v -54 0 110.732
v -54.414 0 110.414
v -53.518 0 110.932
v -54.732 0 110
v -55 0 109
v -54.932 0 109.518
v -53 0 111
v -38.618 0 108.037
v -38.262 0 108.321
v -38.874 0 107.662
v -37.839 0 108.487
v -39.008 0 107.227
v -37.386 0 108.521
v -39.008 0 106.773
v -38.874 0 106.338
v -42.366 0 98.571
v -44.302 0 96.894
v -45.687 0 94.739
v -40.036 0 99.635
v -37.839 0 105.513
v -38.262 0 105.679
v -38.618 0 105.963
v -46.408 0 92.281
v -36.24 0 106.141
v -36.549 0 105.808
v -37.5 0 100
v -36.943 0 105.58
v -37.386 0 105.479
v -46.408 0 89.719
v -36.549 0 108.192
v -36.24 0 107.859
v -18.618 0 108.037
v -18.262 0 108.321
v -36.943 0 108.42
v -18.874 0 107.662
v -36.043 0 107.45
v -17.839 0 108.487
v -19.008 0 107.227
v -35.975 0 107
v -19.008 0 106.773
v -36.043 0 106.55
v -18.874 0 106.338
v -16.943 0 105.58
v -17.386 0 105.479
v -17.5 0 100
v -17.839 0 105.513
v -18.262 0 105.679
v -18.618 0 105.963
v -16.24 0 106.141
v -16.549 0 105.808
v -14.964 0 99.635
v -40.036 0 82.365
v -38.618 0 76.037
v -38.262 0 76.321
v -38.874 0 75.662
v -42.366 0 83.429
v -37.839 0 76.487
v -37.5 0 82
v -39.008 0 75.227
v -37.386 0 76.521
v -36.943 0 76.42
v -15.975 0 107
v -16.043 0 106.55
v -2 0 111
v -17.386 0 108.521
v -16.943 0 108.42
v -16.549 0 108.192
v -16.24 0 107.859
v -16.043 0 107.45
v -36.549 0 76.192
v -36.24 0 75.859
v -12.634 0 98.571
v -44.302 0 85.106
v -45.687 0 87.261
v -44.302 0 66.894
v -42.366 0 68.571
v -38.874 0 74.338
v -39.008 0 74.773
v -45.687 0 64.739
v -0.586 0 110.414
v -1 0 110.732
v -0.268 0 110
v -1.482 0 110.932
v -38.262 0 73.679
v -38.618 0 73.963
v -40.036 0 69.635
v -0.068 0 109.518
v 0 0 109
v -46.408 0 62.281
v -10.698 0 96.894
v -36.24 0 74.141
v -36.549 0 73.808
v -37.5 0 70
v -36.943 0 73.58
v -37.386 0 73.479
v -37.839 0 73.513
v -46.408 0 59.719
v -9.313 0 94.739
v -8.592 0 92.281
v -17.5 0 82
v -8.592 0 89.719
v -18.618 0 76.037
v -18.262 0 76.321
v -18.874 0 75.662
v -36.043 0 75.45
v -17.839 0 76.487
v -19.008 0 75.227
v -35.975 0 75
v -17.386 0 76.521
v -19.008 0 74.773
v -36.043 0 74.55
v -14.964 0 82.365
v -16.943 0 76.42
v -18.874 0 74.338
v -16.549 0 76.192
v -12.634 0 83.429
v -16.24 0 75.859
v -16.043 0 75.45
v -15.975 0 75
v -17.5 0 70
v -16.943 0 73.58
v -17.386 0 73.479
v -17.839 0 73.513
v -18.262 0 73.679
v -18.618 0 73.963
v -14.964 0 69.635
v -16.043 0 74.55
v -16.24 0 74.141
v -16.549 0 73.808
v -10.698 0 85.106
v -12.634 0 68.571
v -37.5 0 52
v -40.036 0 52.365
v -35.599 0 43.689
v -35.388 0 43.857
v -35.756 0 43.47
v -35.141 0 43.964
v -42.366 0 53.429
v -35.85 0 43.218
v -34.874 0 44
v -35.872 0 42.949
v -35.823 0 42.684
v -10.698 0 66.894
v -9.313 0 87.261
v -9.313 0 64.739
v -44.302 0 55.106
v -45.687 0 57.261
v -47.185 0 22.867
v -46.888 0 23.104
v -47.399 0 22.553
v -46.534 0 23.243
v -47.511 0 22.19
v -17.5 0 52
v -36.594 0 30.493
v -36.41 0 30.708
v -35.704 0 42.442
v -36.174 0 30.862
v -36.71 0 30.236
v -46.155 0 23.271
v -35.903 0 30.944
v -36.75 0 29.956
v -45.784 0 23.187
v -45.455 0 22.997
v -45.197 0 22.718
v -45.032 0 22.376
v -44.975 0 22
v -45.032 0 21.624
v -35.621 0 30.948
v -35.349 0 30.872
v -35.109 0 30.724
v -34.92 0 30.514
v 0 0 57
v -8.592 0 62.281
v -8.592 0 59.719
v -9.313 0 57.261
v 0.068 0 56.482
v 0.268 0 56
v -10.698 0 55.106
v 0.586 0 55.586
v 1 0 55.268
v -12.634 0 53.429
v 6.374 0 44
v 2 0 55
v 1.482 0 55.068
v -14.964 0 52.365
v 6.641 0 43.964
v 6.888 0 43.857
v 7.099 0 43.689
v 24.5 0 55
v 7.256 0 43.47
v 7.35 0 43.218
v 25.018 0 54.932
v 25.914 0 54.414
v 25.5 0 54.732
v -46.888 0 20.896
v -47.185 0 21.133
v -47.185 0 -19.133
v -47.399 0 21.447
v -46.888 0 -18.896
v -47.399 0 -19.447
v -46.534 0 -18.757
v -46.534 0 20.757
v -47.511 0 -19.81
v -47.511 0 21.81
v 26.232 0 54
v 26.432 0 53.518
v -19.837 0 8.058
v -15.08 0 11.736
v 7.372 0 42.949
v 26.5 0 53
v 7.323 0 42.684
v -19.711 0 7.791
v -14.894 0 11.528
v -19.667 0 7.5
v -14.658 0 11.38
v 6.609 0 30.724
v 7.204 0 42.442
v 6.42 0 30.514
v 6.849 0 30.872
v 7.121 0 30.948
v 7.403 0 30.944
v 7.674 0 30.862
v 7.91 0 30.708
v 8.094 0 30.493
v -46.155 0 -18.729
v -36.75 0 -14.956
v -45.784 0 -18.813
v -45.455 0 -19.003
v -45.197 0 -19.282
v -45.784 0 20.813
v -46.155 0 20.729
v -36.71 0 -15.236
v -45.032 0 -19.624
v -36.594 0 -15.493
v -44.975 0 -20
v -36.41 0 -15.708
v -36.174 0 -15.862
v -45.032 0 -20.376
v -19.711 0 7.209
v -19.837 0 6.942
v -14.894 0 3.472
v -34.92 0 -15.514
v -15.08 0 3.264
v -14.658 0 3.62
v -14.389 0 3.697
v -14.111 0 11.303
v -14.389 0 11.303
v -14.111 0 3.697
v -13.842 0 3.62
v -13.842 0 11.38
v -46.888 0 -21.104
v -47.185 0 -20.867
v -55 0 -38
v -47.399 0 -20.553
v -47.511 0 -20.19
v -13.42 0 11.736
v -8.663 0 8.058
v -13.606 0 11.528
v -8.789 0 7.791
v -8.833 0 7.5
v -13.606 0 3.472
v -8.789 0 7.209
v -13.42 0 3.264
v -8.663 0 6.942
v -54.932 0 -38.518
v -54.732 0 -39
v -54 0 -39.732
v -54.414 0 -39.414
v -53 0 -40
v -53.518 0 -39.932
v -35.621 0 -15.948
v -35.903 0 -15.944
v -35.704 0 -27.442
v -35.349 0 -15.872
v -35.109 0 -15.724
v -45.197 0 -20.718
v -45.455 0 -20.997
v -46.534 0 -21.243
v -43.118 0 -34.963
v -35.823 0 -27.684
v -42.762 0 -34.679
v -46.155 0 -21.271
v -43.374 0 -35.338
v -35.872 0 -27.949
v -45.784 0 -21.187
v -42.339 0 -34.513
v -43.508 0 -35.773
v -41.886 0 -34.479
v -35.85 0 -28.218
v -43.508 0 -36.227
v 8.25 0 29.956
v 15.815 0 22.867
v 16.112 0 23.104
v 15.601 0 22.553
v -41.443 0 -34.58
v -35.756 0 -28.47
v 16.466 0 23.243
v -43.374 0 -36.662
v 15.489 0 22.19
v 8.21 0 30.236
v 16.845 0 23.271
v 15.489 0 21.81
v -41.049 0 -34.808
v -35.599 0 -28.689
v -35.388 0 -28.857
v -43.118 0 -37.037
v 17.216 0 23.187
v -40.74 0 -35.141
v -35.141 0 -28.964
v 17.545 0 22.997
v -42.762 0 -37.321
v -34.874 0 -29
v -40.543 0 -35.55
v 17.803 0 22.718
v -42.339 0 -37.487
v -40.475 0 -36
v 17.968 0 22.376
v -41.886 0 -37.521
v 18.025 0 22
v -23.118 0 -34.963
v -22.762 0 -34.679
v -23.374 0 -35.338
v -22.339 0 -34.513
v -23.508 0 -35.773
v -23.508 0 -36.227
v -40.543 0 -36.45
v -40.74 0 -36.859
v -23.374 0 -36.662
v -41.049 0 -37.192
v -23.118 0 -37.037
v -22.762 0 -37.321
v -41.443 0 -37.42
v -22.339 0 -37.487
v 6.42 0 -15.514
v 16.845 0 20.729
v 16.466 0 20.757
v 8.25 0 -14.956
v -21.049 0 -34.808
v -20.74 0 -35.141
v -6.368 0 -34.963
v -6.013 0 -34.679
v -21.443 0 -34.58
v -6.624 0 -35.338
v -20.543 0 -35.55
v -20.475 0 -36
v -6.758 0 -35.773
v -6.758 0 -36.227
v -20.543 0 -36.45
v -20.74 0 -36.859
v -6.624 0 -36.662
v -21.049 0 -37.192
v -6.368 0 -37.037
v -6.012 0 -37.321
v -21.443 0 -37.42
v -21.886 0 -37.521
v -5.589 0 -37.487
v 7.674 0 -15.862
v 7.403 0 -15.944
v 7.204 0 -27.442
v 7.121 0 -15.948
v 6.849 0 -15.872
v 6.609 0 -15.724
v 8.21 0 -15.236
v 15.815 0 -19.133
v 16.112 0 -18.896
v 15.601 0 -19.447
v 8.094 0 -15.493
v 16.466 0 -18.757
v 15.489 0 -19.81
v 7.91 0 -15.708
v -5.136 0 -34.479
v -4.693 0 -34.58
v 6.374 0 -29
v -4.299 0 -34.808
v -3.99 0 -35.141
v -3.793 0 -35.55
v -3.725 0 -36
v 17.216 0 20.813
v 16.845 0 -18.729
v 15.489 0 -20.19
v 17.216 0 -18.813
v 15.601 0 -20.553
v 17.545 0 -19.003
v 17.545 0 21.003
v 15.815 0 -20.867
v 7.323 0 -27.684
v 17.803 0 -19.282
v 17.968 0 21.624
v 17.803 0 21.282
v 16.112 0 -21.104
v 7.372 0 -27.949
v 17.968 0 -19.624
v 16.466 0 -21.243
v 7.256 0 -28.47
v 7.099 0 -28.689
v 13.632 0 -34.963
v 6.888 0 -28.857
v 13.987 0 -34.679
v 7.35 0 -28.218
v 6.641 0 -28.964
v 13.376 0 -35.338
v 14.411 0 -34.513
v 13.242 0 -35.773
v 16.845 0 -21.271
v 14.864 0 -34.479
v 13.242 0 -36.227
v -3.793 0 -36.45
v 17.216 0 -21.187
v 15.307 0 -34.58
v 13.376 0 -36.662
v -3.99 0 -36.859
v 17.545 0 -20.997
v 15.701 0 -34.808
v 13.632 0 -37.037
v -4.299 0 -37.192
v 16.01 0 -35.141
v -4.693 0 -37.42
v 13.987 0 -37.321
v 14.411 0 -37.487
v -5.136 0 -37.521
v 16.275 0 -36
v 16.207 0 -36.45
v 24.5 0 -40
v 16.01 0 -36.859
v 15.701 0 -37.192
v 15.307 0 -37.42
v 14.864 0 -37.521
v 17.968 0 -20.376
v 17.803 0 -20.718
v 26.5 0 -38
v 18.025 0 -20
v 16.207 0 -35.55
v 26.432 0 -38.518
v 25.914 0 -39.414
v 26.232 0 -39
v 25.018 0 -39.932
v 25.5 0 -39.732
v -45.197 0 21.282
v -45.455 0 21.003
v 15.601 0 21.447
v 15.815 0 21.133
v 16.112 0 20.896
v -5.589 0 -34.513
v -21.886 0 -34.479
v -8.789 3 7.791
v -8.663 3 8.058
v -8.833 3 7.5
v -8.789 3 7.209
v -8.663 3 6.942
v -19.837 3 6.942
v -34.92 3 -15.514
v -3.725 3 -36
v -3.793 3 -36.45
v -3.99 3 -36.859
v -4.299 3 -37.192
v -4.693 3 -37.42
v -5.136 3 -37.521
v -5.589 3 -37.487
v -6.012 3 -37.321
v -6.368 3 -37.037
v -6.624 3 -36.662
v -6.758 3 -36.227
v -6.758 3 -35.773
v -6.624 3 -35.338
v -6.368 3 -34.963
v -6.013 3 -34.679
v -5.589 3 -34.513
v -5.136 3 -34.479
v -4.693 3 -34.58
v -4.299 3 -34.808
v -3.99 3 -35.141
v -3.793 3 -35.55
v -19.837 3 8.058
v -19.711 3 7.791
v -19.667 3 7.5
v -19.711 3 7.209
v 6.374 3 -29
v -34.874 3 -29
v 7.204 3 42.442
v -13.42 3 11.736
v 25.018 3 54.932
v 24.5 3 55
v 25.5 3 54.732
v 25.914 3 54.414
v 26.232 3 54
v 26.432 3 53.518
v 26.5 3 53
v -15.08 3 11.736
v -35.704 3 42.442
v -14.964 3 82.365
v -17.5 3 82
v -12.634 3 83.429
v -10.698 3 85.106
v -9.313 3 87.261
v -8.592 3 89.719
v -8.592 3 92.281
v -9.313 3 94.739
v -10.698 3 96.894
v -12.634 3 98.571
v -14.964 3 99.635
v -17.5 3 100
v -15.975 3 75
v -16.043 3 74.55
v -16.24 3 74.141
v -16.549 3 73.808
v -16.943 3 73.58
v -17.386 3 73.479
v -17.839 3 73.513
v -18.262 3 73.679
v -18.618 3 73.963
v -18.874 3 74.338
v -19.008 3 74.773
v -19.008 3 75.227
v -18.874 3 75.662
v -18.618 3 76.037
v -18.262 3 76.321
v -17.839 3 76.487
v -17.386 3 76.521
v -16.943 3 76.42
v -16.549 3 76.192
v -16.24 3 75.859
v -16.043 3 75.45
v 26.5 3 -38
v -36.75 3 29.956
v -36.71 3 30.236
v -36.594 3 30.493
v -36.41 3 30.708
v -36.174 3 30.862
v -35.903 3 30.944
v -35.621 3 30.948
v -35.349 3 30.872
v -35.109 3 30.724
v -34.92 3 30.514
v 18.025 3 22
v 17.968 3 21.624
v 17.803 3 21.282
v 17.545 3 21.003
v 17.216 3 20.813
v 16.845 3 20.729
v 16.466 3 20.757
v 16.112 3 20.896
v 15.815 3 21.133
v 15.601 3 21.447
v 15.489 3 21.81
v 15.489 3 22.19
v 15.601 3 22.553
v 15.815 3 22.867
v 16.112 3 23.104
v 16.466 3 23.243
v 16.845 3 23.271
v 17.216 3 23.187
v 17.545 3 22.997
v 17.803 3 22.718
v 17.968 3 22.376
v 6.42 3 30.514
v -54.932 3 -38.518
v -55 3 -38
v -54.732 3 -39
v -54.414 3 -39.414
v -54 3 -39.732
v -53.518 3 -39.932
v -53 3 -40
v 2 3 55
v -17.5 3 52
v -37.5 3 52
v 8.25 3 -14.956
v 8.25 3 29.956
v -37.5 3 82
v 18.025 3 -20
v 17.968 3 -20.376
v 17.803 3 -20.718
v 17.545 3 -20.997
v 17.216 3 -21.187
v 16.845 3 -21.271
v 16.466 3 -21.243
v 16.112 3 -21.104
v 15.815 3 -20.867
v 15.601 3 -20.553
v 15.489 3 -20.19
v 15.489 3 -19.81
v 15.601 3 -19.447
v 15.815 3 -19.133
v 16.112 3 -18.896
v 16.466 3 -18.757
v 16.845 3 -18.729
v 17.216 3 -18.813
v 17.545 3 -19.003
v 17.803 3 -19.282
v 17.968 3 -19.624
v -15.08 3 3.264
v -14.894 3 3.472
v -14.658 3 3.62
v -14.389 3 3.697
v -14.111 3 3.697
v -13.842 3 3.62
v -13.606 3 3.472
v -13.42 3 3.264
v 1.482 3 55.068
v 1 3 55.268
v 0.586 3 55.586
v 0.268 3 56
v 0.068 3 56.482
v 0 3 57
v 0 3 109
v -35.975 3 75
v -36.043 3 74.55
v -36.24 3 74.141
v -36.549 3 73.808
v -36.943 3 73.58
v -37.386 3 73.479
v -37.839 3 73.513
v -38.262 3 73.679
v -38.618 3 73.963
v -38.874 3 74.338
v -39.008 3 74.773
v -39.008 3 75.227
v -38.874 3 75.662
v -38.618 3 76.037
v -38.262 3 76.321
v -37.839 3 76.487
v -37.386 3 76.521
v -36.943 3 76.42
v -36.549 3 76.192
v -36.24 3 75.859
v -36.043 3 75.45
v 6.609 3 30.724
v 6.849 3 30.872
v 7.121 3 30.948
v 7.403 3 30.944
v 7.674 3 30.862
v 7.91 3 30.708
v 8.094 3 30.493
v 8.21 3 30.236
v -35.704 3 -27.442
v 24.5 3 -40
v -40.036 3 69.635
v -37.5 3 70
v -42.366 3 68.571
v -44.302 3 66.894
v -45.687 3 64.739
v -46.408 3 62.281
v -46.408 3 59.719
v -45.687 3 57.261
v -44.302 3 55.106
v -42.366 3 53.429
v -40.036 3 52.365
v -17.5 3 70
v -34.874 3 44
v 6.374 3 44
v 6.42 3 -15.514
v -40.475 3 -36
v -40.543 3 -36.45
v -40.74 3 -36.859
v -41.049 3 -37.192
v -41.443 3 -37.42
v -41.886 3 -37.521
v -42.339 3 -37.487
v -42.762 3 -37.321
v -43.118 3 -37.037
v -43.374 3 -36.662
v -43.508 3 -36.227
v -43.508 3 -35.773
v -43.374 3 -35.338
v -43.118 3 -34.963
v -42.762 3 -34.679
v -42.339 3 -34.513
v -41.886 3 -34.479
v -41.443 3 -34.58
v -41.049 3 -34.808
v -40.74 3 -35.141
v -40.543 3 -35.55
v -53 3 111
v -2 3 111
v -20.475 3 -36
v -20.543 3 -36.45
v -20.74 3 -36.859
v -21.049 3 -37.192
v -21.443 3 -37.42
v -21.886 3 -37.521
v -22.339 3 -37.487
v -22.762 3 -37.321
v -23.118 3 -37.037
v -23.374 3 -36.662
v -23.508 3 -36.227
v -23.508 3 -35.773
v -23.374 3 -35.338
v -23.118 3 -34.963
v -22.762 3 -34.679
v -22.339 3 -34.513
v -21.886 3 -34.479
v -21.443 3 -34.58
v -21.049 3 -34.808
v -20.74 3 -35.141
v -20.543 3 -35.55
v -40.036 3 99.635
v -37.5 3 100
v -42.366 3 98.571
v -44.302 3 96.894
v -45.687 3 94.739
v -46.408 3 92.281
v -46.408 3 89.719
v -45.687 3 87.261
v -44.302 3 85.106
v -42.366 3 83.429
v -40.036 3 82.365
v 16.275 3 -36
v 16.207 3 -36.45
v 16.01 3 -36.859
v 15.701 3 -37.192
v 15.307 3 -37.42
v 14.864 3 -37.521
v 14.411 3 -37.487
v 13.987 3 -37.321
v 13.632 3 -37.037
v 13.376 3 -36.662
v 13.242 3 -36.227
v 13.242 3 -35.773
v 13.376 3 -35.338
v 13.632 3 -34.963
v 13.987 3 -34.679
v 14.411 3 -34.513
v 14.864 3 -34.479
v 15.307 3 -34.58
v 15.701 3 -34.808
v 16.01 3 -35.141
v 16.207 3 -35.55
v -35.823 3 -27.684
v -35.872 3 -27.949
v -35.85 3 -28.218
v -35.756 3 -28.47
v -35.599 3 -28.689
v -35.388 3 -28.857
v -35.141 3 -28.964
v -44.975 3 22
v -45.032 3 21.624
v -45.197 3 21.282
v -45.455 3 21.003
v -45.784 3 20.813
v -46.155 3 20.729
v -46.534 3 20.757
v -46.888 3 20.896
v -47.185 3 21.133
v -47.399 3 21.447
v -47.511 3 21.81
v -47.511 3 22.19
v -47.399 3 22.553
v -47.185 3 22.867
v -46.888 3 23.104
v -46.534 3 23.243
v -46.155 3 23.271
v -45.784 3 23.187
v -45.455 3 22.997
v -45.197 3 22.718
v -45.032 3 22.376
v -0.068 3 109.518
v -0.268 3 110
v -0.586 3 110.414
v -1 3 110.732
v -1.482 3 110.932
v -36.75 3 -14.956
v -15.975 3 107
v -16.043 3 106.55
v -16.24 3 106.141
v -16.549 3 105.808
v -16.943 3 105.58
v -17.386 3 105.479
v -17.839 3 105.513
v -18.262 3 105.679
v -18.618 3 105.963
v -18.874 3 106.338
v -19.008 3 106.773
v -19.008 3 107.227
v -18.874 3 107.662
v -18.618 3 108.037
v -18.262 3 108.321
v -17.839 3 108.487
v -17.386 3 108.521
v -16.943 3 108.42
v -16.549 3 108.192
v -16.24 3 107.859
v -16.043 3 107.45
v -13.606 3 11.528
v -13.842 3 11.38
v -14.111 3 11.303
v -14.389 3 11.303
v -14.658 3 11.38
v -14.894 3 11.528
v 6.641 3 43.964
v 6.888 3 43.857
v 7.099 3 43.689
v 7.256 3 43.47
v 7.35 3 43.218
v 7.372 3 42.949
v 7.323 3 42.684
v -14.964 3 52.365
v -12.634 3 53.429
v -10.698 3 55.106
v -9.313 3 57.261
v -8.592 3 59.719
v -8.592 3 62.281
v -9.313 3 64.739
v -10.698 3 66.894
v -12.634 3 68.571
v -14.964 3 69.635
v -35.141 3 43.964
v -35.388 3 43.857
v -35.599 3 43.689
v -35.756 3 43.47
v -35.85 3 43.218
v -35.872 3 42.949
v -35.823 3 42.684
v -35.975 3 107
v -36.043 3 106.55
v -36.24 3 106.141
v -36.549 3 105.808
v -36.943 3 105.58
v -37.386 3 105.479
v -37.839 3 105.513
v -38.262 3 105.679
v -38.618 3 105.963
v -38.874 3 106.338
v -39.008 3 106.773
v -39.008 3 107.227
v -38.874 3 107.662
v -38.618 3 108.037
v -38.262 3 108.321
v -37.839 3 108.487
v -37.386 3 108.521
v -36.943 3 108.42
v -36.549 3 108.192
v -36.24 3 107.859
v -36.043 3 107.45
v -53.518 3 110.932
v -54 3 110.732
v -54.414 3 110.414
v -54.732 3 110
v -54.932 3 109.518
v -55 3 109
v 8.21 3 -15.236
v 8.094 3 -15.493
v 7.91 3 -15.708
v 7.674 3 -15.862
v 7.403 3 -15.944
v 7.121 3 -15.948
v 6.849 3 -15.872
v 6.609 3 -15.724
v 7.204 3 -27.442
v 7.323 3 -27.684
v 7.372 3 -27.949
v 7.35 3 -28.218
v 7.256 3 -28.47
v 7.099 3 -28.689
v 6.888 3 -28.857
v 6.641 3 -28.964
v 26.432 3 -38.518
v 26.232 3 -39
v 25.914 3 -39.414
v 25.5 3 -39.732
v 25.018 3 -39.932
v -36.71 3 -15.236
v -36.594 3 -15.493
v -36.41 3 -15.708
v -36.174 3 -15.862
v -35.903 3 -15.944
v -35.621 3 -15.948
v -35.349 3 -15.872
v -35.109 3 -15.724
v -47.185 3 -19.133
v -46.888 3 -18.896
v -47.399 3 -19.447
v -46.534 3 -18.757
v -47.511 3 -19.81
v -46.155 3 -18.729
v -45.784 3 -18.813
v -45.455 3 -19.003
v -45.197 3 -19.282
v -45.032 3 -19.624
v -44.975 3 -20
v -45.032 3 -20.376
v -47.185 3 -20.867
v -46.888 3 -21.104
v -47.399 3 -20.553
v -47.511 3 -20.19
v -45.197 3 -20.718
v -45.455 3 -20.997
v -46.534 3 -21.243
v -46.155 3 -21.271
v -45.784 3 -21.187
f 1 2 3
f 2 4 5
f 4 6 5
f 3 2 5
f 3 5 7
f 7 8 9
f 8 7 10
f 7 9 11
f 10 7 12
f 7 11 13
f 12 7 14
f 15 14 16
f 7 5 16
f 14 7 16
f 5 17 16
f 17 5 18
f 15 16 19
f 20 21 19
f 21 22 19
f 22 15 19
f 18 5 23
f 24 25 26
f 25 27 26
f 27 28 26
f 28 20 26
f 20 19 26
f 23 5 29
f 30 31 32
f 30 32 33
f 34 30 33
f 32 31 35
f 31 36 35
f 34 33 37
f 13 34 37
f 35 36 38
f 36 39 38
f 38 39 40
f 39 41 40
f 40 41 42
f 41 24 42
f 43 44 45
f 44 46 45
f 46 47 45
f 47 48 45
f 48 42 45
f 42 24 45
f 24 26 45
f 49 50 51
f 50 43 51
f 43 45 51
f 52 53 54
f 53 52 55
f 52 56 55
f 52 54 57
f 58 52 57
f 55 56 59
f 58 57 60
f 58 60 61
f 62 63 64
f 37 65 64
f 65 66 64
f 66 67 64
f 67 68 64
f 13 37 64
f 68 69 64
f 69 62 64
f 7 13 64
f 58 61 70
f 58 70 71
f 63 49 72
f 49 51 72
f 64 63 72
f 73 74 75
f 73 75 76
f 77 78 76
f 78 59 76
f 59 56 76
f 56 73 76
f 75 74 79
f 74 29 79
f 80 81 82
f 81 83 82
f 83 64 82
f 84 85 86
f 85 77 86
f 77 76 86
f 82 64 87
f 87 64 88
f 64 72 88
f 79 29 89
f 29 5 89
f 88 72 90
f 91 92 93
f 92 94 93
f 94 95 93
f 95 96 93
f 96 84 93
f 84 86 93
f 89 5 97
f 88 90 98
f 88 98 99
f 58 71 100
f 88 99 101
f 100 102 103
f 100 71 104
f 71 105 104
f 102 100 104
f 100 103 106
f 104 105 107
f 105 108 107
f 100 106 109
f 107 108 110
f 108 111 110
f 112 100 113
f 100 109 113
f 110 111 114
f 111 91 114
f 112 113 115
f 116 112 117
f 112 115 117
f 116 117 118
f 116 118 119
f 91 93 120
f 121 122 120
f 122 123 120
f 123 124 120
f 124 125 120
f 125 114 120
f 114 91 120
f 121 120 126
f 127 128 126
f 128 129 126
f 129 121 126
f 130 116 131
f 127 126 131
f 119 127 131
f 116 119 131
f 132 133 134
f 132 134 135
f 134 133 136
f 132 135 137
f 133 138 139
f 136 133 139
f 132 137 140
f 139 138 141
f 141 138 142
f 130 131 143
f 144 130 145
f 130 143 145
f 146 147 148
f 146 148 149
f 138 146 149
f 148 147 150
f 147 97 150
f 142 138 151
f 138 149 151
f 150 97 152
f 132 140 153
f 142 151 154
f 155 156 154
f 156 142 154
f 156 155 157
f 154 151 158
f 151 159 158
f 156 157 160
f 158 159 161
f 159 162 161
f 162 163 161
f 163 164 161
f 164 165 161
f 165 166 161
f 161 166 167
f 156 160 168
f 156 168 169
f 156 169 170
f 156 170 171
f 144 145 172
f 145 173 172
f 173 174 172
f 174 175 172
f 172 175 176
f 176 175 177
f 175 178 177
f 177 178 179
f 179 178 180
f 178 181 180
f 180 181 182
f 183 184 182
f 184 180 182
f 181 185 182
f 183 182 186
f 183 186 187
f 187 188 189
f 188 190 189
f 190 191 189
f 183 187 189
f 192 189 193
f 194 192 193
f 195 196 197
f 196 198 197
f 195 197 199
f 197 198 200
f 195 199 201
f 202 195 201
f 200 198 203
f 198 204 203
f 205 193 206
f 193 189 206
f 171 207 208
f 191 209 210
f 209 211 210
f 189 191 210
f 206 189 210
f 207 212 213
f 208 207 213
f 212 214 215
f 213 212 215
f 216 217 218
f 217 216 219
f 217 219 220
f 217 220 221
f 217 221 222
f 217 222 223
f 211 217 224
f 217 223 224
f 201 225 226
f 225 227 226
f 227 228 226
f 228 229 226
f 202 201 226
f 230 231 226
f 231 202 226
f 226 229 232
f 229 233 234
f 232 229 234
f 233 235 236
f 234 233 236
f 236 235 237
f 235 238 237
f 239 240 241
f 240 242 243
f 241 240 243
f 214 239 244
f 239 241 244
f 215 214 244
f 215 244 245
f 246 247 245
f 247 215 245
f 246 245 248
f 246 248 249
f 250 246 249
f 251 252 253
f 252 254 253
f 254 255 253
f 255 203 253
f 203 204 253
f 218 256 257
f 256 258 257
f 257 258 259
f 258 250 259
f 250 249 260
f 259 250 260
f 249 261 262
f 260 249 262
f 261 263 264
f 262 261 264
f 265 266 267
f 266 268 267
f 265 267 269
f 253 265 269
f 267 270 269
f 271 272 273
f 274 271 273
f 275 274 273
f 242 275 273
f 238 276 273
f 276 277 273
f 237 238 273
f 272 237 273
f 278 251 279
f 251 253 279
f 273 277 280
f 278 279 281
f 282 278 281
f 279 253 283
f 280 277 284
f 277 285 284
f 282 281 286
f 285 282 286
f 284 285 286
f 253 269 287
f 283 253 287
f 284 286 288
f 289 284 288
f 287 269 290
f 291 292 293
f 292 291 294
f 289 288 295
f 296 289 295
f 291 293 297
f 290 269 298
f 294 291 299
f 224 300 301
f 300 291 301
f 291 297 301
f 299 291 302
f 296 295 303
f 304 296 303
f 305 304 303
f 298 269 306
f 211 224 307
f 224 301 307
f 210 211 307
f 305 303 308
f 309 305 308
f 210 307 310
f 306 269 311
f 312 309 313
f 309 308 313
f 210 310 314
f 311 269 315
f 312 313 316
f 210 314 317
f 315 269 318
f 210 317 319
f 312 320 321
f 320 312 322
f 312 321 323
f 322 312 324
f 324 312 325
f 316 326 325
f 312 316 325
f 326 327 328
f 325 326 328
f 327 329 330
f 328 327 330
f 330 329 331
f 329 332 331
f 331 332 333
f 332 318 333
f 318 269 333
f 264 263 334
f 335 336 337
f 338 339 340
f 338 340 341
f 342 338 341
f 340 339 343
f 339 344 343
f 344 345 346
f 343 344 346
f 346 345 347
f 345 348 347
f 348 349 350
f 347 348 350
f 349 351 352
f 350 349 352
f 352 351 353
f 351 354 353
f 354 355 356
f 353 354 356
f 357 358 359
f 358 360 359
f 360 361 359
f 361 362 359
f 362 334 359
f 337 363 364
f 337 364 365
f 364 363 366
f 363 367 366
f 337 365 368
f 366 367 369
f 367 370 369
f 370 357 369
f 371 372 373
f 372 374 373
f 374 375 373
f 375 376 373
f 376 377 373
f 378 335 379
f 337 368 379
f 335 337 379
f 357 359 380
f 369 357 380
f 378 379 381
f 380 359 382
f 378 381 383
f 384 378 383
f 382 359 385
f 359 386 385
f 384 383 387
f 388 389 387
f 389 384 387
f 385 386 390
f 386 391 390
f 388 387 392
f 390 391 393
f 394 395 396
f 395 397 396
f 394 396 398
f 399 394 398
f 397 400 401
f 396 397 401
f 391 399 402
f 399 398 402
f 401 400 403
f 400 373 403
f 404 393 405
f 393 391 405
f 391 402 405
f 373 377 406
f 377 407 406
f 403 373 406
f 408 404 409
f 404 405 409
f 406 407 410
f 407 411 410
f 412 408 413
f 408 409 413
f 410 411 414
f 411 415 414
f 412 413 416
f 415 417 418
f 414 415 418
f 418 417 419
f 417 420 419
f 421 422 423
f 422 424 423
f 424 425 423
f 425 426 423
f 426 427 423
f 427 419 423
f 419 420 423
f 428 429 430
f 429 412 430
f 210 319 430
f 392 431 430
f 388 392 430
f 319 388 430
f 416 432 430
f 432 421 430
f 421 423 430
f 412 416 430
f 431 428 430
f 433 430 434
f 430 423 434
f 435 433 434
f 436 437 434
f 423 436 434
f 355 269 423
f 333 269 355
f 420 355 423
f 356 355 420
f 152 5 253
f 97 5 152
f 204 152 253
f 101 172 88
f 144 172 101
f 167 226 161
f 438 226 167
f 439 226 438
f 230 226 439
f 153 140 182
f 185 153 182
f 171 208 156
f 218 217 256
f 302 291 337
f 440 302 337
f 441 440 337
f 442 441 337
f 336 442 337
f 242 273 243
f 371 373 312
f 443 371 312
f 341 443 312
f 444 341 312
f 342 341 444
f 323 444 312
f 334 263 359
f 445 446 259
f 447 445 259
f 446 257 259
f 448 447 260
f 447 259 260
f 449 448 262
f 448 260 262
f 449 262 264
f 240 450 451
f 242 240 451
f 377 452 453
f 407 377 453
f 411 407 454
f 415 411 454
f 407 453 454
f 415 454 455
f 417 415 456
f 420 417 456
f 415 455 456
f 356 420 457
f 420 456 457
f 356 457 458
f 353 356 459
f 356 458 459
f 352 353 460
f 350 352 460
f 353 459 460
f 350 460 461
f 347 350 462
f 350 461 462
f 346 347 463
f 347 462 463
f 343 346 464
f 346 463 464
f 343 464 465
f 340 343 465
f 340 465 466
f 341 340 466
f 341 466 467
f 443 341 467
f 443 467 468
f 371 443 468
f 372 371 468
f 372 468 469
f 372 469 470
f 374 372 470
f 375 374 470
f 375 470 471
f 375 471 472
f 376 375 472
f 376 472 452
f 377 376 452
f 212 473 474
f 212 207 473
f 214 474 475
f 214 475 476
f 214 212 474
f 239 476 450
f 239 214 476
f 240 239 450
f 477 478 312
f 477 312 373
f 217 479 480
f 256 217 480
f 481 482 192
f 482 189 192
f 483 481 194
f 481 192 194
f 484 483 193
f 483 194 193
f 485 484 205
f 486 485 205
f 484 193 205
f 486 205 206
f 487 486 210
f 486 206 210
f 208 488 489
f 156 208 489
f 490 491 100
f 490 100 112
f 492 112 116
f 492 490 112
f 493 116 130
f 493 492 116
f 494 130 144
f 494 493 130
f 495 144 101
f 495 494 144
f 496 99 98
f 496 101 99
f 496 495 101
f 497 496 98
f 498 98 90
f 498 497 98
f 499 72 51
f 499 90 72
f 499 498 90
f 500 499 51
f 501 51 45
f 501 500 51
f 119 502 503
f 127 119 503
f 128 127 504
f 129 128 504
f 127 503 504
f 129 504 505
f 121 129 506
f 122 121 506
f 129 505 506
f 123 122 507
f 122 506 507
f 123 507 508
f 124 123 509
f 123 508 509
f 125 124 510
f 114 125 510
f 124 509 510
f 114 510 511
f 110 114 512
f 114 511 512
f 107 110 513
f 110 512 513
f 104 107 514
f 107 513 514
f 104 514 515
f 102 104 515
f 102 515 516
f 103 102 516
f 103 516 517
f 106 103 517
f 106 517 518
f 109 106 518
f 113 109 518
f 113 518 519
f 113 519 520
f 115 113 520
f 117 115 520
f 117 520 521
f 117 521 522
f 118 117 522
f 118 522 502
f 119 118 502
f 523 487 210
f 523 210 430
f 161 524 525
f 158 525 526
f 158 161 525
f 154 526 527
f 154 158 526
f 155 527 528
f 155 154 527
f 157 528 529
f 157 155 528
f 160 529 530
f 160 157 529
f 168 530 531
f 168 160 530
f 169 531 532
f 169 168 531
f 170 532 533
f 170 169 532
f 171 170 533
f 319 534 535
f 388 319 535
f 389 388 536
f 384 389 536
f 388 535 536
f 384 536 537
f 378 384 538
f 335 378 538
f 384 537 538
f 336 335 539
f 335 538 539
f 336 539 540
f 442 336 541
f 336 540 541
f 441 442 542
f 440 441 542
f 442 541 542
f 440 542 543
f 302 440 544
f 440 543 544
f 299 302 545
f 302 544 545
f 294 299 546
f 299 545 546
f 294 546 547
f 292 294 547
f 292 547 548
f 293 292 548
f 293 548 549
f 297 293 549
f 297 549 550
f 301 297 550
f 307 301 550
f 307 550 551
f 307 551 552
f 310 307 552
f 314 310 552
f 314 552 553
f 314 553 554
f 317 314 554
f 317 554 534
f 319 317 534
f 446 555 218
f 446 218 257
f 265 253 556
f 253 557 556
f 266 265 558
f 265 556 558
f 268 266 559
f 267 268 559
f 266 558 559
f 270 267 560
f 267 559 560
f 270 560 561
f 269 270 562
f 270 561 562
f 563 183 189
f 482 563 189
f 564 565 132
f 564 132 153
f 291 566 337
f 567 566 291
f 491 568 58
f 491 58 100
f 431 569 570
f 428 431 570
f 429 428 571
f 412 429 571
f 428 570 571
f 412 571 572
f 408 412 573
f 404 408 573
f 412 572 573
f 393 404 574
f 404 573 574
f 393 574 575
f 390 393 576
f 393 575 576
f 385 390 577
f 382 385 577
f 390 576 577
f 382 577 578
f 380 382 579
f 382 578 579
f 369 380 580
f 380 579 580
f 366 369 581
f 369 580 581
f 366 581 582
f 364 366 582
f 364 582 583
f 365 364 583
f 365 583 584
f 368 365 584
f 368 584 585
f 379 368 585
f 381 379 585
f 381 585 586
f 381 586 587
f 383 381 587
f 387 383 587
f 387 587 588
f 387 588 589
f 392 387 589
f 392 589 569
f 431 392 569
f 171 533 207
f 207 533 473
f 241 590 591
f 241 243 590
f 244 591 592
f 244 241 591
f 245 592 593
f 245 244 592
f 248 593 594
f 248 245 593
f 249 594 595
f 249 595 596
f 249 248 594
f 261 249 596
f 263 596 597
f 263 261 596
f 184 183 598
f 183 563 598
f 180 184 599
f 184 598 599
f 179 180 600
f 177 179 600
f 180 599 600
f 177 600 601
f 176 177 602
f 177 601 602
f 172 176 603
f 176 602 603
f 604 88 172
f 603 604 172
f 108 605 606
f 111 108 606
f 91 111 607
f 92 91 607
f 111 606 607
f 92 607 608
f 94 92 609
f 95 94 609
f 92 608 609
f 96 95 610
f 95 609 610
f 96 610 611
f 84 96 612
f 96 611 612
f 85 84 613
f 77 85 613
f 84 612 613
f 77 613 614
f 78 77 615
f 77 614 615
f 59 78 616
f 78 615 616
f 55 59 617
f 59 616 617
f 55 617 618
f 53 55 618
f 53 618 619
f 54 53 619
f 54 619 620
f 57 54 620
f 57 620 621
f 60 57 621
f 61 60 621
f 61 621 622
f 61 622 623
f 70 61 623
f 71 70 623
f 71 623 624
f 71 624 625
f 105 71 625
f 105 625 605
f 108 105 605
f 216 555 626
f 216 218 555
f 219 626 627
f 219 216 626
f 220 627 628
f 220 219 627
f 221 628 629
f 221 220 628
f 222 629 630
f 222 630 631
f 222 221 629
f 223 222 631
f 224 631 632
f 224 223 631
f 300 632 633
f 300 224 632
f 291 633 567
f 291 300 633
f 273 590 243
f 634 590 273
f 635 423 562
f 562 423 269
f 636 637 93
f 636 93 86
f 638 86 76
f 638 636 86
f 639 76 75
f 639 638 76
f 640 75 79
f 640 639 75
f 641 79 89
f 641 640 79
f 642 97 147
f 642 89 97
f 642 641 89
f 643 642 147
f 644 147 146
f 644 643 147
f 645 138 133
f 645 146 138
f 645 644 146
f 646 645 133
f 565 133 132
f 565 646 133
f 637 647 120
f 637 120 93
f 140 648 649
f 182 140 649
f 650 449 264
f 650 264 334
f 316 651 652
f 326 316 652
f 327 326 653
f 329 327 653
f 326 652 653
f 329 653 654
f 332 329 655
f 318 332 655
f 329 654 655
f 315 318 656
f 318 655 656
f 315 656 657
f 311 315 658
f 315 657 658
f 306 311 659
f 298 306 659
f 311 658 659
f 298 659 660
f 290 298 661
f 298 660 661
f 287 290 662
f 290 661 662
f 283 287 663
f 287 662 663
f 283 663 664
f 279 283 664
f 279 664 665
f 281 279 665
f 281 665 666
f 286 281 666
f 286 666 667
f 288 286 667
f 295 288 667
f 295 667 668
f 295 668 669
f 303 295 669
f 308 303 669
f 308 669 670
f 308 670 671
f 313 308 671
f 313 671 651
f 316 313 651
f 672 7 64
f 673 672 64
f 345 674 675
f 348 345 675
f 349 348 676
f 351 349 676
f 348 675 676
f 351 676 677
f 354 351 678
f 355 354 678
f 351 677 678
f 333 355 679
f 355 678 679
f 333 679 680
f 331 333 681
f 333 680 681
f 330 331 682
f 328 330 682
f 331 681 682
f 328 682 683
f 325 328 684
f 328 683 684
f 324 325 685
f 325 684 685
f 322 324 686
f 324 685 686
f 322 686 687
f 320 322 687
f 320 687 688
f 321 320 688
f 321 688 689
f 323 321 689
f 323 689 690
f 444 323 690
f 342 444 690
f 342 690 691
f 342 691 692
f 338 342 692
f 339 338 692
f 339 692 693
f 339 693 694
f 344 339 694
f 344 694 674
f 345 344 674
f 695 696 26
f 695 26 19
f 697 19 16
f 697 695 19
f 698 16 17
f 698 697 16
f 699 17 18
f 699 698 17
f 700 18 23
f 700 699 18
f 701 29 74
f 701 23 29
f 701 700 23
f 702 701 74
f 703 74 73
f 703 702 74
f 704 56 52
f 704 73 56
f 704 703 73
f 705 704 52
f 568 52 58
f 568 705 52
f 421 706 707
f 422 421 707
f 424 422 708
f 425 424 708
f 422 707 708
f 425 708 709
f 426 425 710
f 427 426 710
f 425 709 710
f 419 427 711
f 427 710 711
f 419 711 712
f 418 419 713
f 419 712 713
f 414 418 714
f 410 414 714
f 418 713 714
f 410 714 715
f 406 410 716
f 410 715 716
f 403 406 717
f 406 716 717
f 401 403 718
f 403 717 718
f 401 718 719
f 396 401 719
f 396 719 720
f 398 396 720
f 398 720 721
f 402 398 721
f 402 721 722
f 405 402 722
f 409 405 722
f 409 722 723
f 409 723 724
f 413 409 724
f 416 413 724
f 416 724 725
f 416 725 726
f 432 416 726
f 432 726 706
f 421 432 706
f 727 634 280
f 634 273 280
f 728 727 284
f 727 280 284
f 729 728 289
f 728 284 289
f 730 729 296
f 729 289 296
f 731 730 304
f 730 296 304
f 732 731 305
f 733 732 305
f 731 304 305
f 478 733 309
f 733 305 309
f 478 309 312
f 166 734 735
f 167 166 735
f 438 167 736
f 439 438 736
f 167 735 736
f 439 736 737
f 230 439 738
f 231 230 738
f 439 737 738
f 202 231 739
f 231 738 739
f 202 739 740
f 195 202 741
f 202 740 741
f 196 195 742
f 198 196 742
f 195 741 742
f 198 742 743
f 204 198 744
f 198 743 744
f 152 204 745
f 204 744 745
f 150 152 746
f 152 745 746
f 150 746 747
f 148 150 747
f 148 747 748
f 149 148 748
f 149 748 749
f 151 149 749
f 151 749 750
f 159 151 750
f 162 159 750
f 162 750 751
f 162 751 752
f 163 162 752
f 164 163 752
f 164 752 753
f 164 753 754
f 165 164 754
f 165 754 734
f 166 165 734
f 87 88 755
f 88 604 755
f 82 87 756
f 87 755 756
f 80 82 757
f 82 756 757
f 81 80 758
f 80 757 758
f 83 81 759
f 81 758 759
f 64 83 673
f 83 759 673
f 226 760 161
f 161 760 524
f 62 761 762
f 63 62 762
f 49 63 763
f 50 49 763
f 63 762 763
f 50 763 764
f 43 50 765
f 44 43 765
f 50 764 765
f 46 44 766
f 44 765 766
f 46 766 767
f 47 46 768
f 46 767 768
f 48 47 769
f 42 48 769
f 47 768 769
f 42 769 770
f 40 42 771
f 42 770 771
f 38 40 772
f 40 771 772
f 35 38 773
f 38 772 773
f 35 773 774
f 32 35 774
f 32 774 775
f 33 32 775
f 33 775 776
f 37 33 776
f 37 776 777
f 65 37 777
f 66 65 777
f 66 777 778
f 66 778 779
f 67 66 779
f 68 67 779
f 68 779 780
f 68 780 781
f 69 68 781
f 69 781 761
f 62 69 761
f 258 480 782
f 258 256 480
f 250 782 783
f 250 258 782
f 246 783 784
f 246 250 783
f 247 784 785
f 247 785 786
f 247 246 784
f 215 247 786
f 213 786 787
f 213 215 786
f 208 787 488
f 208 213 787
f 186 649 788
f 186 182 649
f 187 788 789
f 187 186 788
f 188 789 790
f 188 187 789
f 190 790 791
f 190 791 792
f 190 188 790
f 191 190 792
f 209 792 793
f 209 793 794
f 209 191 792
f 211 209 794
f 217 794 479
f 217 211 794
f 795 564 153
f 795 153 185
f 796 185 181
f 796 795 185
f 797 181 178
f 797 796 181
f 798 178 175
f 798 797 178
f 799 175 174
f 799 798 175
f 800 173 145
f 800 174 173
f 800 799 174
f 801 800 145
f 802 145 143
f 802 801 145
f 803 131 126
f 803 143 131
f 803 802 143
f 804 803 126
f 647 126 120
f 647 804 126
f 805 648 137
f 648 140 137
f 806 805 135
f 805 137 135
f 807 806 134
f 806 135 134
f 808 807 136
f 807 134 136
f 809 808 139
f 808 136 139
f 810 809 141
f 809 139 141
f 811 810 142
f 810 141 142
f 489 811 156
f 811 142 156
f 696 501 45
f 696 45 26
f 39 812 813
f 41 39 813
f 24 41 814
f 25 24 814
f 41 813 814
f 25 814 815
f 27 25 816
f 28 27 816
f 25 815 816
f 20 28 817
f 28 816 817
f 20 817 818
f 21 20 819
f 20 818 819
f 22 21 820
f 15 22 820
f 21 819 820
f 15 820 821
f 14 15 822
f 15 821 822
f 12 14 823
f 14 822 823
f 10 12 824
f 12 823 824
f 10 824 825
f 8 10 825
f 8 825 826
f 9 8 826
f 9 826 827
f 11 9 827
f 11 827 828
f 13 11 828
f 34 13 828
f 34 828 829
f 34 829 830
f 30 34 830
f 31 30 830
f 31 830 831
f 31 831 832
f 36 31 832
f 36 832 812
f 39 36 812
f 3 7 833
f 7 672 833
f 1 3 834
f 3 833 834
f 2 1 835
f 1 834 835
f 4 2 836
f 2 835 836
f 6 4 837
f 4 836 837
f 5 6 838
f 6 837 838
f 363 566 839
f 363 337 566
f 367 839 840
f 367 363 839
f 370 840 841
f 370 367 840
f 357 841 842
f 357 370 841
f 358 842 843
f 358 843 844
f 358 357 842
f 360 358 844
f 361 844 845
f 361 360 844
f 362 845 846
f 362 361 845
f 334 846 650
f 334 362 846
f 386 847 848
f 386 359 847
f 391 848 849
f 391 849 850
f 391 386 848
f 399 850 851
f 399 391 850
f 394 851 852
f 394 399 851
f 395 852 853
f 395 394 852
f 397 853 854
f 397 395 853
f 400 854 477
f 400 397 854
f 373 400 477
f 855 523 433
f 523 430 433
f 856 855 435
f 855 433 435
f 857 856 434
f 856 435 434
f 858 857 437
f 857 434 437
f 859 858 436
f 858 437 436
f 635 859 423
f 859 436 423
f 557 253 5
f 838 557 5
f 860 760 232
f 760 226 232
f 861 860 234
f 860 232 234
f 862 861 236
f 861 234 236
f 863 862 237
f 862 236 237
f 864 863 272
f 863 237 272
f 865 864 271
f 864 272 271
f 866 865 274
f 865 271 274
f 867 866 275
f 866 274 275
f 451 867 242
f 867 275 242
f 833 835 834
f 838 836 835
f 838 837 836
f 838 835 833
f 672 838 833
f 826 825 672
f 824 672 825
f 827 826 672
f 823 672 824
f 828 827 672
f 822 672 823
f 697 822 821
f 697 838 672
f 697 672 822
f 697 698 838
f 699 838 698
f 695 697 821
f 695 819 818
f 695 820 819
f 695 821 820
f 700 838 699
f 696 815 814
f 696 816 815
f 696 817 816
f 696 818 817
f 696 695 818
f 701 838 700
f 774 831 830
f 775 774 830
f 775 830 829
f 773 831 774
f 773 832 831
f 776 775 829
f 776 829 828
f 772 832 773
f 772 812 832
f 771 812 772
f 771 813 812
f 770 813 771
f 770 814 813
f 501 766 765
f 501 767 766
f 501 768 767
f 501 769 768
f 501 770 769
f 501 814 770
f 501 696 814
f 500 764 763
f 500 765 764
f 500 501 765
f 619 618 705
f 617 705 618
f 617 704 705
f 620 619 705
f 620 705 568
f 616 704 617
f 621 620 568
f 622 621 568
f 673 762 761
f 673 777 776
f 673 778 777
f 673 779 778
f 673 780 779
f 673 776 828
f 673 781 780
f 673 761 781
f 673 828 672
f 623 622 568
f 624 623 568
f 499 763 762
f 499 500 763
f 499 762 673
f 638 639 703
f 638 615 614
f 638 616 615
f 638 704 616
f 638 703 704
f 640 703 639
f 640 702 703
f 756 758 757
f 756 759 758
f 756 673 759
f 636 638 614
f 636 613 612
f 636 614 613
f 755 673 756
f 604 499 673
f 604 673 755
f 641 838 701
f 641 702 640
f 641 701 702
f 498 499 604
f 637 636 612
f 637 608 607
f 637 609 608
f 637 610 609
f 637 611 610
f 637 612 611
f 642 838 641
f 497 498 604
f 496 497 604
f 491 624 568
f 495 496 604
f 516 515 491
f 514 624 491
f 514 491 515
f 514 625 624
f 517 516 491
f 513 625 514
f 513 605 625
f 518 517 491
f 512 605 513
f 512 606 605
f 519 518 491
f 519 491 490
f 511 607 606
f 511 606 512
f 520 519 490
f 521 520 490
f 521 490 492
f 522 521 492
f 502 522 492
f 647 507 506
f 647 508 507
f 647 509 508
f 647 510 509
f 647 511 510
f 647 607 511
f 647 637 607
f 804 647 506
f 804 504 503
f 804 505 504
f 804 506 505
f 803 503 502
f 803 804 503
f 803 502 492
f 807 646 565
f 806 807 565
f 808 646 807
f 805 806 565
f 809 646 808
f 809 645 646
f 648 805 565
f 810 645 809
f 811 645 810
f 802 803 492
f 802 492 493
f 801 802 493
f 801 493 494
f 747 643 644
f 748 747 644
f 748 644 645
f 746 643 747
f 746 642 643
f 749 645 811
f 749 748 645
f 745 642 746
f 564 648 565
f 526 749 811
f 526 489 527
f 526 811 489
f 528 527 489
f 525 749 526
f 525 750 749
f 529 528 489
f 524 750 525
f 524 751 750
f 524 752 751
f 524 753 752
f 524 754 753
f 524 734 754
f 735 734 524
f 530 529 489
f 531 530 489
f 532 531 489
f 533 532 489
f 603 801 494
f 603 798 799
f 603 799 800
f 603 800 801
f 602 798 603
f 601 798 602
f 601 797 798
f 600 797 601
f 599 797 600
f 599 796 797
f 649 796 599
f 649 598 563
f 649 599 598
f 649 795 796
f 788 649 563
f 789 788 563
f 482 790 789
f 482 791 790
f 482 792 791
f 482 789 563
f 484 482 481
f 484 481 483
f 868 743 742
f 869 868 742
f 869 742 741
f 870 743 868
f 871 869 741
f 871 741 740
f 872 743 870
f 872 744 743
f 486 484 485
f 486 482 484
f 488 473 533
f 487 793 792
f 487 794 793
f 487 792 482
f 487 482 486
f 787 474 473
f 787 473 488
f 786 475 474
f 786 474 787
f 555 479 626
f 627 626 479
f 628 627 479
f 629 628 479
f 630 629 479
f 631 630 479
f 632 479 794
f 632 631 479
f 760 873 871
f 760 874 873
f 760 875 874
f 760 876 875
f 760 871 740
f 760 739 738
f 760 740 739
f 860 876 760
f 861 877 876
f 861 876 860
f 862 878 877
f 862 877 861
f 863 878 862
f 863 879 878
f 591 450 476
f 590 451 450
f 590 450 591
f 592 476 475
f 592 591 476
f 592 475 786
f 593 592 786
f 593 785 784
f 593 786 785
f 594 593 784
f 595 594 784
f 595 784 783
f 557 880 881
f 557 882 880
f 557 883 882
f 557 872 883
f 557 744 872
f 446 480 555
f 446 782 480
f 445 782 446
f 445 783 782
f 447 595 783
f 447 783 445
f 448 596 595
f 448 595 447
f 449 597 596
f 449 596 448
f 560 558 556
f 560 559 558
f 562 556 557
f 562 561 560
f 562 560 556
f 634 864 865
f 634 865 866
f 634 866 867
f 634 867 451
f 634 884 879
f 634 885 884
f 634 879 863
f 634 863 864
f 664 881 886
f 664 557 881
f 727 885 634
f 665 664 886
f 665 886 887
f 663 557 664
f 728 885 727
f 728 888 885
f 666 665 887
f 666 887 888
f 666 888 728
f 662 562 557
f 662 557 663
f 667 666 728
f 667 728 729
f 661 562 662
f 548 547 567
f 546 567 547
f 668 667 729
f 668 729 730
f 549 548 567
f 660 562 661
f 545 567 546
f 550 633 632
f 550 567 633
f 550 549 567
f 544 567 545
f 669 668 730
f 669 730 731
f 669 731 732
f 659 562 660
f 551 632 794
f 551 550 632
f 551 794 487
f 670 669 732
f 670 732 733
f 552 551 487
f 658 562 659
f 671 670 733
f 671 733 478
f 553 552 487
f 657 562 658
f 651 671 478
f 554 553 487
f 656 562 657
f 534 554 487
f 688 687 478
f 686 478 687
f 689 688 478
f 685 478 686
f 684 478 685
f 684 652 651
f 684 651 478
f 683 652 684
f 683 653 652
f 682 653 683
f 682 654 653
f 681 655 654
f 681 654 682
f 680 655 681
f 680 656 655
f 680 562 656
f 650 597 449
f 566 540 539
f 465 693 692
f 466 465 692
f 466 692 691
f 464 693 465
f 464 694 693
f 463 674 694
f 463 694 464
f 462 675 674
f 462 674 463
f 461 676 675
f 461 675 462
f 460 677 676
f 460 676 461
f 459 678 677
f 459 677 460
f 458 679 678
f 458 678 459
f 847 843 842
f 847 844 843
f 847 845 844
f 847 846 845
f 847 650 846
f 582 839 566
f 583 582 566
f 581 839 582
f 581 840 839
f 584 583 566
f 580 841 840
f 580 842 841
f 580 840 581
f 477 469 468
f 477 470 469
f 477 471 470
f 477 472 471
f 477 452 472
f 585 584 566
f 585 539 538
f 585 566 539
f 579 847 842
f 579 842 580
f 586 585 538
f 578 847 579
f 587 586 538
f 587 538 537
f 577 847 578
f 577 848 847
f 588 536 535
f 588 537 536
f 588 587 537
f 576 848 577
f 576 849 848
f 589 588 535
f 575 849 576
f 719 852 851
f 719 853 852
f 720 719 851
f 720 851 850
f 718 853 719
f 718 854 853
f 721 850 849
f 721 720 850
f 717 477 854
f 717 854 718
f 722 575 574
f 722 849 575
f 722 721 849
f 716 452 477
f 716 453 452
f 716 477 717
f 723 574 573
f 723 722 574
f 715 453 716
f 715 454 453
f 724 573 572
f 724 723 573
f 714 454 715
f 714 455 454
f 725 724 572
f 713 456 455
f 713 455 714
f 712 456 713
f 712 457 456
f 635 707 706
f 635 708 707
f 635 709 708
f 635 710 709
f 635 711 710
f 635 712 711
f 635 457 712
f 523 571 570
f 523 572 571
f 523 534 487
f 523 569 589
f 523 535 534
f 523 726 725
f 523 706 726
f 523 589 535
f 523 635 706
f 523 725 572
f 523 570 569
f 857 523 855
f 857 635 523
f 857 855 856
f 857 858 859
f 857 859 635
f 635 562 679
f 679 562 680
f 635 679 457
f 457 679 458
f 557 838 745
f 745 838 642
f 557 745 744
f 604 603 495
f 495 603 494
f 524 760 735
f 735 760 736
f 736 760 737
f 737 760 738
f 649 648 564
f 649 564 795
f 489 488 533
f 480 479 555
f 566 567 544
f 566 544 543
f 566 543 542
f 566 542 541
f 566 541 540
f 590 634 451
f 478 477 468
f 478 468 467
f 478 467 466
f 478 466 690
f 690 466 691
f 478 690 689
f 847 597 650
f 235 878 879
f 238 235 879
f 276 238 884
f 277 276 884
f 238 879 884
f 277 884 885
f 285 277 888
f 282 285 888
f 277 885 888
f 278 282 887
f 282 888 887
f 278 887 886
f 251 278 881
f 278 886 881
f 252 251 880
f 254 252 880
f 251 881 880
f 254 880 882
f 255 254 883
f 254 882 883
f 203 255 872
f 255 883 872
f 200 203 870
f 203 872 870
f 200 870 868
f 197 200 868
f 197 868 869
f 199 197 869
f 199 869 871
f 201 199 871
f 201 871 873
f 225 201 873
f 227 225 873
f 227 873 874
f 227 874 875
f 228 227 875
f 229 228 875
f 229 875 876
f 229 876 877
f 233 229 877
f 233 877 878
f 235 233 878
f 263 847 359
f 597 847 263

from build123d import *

# Parameters (mm, degrees)
EXTRUDE_1_DEPTH          = 3
SKETCH_2_R               = 1.525
CUT_EXTRUDE_1_DEPTH      = 4
SKETCH_3_R               = 1.275
CUT_EXTRUDE_2_DEPTH      = 4
SKETCH_5_W               = 6.5
SKETCH_5_H               = 95
CUT_EXTRUDE_4_DEPTH      = 4
FILLET_3_R               = 2
CUT_EXTRUDE_5_DEPTH      = 1
CUT_EXTRUDE_5_DEPTH_BACK = 4
FILLET_4_R               = 1
CUT_EXTRUDE_6_DEPTH      = 1
CUT_EXTRUDE_6_DEPTH_BACK = 4


with BuildPart() as part:
    # 草图1 → 凸台-拉伸1 (new body)
    with BuildSketch(Plane(origin=(0, 0, 0), x_dir=(1, 0, 0), z_dir=(0, 1, 0))):
        Polygon((33, -55), (33, 0), (33, 40), (-55, 40), (-55, -111), (0, -111), (0, -55), align=None)
    extrude(amount=EXTRUDE_1_DEPTH)

    # 草图2 → 切除-拉伸1 (cut, through all)
    with BuildSketch(Plane(origin=(0, 3, 0), x_dir=(1, 0, 0), z_dir=(0, 1, 0))):
        with Locations((-37.5, -107)):
            Circle(SKETCH_2_R)
        with Locations((-17.5, -107)):
            Circle(SKETCH_2_R)
        with Locations((-37.5, -75)):
            Circle(SKETCH_2_R)
        with Locations((-17.5, -75)):
            Circle(SKETCH_2_R)
        with Locations((-42, 36)):
            Circle(SKETCH_2_R)
        with Locations((-22, 36)):
            Circle(SKETCH_2_R)
        with Locations((-5.25, 36)):
            Circle(SKETCH_2_R)
        with Locations((14.75, 36)):
            Circle(SKETCH_2_R)
    extrude(amount=-CUT_EXTRUDE_1_DEPTH, mode=Mode.SUBTRACT)

    # 草图3 → 切除-拉伸2 (cut, through all)
    with BuildSketch(Plane(origin=(0, 3, 0), x_dir=(1, 0, 0), z_dir=(0, 1, 0))):
        with Locations((16.75, 20)):
            Circle(SKETCH_3_R)
        with Locations((-46.25, 20)):
            Circle(SKETCH_3_R)
        with Locations((16.75, -22)):
            Circle(SKETCH_3_R)
        with Locations((-46.25, -22)):
            Circle(SKETCH_3_R)
    extrude(amount=-CUT_EXTRUDE_2_DEPTH, mode=Mode.SUBTRACT)

    # 草图5 → 切除-拉伸4 (cut, through all)
    with BuildSketch(Plane(origin=(0, 3, 0), x_dir=(1, 0, 0), z_dir=(0, 1, 0))):
        with Locations((29.75, -7.5)):
            Rectangle(SKETCH_5_W, SKETCH_5_H)
    extrude(amount=-CUT_EXTRUDE_4_DEPTH, mode=Mode.SUBTRACT)

    # 圆角3
    fillet_3_edges = [part.edges().sort_by_distance(p)[0] for p in [
        (0, 1.5, 111),
        (-55, 1.5, 111),
        (-55, 1.5, -40),
        (0, 1.5, 55),
        (26.5, 1.5, 55),
        (26.5, 1.5, -40),
    ]]
    fillet(fillet_3_edges, radius=FILLET_3_R)

    # 草图6 → 切除-拉伸5 (cut, two sides)
    with BuildSketch(Plane(origin=(0, 3, 0), x_dir=(1, 0, 0), z_dir=(0, 1, 0))) as cut_extrude_5_sk:
        Polygon((-36.75, 29), (8.25, 29), (-14.25, -4.5), align=None)
        Polygon((-36.75, 18.238752654), (-36.75, -33.238752654), (-19.462778068, -7.5), align=None)
        Polygon((-9.037221932, -7.5), (8.25, 18.238752654), (8.25, -33.238752654), align=None)
        Polygon((-36.75, -44), (8.25, -44), (-14.25, -10.5), align=None)
    extrude(amount=CUT_EXTRUDE_5_DEPTH, mode=Mode.SUBTRACT)
    extrude(cut_extrude_5_sk.sketch, amount=-CUT_EXTRUDE_5_DEPTH_BACK, mode=Mode.SUBTRACT)

    # 圆角4
    fillet_4_edges = [part.edges().sort_by_distance(p)[0] for p in [
        (-36.75, 1.5, -18.238752654),
        (-19.462778068, 1.5, 7.5),
        (-36.75, 1.5, 33.238752654),
        (8.25, 1.5, 33.238752654),
        (-9.037221932, 1.5, 7.5),
        (8.25, 1.5, -18.238752654),
        (-36.75, 1.5, 44),
        (-14.25, 1.5, 10.5),
        (8.25, 1.5, 44),
        (-14.25, 1.5, 4.5),
        (-36.75, 1.5, -29),
        (8.25, 1.5, -29),
    ]]
    fillet(fillet_4_edges, radius=FILLET_4_R)

    # 草图7 → 切除-拉伸6 (cut, two sides)
    with BuildSketch(Plane(origin=(0, 3, 0), x_dir=(1, 0, 0), z_dir=(0, 1, 0))) as cut_extrude_6_sk:
        with BuildLine():
            Line((-37.5, -52), (-17.5, -52))
            ThreePointArc((-17.5, -52), (-8.5, -61), (-17.5, -70))
            Line((-17.5, -70), (-37.5, -70))
            ThreePointArc((-37.5, -70), (-46.5, -61), (-37.5, -52))
        make_face()
        with BuildLine():
            Line((-37.5, -82), (-17.5, -82))
            ThreePointArc((-17.5, -82), (-8.5, -91), (-17.5, -100))
            Line((-17.5, -100), (-37.5, -100))
            ThreePointArc((-37.5, -100), (-46.5, -91), (-37.5, -82))
        make_face()
    extrude(amount=CUT_EXTRUDE_6_DEPTH, mode=Mode.SUBTRACT)
    extrude(cut_extrude_6_sk.sketch, amount=-CUT_EXTRUDE_6_DEPTH_BACK, mode=Mode.SUBTRACT)


solid = part.part
